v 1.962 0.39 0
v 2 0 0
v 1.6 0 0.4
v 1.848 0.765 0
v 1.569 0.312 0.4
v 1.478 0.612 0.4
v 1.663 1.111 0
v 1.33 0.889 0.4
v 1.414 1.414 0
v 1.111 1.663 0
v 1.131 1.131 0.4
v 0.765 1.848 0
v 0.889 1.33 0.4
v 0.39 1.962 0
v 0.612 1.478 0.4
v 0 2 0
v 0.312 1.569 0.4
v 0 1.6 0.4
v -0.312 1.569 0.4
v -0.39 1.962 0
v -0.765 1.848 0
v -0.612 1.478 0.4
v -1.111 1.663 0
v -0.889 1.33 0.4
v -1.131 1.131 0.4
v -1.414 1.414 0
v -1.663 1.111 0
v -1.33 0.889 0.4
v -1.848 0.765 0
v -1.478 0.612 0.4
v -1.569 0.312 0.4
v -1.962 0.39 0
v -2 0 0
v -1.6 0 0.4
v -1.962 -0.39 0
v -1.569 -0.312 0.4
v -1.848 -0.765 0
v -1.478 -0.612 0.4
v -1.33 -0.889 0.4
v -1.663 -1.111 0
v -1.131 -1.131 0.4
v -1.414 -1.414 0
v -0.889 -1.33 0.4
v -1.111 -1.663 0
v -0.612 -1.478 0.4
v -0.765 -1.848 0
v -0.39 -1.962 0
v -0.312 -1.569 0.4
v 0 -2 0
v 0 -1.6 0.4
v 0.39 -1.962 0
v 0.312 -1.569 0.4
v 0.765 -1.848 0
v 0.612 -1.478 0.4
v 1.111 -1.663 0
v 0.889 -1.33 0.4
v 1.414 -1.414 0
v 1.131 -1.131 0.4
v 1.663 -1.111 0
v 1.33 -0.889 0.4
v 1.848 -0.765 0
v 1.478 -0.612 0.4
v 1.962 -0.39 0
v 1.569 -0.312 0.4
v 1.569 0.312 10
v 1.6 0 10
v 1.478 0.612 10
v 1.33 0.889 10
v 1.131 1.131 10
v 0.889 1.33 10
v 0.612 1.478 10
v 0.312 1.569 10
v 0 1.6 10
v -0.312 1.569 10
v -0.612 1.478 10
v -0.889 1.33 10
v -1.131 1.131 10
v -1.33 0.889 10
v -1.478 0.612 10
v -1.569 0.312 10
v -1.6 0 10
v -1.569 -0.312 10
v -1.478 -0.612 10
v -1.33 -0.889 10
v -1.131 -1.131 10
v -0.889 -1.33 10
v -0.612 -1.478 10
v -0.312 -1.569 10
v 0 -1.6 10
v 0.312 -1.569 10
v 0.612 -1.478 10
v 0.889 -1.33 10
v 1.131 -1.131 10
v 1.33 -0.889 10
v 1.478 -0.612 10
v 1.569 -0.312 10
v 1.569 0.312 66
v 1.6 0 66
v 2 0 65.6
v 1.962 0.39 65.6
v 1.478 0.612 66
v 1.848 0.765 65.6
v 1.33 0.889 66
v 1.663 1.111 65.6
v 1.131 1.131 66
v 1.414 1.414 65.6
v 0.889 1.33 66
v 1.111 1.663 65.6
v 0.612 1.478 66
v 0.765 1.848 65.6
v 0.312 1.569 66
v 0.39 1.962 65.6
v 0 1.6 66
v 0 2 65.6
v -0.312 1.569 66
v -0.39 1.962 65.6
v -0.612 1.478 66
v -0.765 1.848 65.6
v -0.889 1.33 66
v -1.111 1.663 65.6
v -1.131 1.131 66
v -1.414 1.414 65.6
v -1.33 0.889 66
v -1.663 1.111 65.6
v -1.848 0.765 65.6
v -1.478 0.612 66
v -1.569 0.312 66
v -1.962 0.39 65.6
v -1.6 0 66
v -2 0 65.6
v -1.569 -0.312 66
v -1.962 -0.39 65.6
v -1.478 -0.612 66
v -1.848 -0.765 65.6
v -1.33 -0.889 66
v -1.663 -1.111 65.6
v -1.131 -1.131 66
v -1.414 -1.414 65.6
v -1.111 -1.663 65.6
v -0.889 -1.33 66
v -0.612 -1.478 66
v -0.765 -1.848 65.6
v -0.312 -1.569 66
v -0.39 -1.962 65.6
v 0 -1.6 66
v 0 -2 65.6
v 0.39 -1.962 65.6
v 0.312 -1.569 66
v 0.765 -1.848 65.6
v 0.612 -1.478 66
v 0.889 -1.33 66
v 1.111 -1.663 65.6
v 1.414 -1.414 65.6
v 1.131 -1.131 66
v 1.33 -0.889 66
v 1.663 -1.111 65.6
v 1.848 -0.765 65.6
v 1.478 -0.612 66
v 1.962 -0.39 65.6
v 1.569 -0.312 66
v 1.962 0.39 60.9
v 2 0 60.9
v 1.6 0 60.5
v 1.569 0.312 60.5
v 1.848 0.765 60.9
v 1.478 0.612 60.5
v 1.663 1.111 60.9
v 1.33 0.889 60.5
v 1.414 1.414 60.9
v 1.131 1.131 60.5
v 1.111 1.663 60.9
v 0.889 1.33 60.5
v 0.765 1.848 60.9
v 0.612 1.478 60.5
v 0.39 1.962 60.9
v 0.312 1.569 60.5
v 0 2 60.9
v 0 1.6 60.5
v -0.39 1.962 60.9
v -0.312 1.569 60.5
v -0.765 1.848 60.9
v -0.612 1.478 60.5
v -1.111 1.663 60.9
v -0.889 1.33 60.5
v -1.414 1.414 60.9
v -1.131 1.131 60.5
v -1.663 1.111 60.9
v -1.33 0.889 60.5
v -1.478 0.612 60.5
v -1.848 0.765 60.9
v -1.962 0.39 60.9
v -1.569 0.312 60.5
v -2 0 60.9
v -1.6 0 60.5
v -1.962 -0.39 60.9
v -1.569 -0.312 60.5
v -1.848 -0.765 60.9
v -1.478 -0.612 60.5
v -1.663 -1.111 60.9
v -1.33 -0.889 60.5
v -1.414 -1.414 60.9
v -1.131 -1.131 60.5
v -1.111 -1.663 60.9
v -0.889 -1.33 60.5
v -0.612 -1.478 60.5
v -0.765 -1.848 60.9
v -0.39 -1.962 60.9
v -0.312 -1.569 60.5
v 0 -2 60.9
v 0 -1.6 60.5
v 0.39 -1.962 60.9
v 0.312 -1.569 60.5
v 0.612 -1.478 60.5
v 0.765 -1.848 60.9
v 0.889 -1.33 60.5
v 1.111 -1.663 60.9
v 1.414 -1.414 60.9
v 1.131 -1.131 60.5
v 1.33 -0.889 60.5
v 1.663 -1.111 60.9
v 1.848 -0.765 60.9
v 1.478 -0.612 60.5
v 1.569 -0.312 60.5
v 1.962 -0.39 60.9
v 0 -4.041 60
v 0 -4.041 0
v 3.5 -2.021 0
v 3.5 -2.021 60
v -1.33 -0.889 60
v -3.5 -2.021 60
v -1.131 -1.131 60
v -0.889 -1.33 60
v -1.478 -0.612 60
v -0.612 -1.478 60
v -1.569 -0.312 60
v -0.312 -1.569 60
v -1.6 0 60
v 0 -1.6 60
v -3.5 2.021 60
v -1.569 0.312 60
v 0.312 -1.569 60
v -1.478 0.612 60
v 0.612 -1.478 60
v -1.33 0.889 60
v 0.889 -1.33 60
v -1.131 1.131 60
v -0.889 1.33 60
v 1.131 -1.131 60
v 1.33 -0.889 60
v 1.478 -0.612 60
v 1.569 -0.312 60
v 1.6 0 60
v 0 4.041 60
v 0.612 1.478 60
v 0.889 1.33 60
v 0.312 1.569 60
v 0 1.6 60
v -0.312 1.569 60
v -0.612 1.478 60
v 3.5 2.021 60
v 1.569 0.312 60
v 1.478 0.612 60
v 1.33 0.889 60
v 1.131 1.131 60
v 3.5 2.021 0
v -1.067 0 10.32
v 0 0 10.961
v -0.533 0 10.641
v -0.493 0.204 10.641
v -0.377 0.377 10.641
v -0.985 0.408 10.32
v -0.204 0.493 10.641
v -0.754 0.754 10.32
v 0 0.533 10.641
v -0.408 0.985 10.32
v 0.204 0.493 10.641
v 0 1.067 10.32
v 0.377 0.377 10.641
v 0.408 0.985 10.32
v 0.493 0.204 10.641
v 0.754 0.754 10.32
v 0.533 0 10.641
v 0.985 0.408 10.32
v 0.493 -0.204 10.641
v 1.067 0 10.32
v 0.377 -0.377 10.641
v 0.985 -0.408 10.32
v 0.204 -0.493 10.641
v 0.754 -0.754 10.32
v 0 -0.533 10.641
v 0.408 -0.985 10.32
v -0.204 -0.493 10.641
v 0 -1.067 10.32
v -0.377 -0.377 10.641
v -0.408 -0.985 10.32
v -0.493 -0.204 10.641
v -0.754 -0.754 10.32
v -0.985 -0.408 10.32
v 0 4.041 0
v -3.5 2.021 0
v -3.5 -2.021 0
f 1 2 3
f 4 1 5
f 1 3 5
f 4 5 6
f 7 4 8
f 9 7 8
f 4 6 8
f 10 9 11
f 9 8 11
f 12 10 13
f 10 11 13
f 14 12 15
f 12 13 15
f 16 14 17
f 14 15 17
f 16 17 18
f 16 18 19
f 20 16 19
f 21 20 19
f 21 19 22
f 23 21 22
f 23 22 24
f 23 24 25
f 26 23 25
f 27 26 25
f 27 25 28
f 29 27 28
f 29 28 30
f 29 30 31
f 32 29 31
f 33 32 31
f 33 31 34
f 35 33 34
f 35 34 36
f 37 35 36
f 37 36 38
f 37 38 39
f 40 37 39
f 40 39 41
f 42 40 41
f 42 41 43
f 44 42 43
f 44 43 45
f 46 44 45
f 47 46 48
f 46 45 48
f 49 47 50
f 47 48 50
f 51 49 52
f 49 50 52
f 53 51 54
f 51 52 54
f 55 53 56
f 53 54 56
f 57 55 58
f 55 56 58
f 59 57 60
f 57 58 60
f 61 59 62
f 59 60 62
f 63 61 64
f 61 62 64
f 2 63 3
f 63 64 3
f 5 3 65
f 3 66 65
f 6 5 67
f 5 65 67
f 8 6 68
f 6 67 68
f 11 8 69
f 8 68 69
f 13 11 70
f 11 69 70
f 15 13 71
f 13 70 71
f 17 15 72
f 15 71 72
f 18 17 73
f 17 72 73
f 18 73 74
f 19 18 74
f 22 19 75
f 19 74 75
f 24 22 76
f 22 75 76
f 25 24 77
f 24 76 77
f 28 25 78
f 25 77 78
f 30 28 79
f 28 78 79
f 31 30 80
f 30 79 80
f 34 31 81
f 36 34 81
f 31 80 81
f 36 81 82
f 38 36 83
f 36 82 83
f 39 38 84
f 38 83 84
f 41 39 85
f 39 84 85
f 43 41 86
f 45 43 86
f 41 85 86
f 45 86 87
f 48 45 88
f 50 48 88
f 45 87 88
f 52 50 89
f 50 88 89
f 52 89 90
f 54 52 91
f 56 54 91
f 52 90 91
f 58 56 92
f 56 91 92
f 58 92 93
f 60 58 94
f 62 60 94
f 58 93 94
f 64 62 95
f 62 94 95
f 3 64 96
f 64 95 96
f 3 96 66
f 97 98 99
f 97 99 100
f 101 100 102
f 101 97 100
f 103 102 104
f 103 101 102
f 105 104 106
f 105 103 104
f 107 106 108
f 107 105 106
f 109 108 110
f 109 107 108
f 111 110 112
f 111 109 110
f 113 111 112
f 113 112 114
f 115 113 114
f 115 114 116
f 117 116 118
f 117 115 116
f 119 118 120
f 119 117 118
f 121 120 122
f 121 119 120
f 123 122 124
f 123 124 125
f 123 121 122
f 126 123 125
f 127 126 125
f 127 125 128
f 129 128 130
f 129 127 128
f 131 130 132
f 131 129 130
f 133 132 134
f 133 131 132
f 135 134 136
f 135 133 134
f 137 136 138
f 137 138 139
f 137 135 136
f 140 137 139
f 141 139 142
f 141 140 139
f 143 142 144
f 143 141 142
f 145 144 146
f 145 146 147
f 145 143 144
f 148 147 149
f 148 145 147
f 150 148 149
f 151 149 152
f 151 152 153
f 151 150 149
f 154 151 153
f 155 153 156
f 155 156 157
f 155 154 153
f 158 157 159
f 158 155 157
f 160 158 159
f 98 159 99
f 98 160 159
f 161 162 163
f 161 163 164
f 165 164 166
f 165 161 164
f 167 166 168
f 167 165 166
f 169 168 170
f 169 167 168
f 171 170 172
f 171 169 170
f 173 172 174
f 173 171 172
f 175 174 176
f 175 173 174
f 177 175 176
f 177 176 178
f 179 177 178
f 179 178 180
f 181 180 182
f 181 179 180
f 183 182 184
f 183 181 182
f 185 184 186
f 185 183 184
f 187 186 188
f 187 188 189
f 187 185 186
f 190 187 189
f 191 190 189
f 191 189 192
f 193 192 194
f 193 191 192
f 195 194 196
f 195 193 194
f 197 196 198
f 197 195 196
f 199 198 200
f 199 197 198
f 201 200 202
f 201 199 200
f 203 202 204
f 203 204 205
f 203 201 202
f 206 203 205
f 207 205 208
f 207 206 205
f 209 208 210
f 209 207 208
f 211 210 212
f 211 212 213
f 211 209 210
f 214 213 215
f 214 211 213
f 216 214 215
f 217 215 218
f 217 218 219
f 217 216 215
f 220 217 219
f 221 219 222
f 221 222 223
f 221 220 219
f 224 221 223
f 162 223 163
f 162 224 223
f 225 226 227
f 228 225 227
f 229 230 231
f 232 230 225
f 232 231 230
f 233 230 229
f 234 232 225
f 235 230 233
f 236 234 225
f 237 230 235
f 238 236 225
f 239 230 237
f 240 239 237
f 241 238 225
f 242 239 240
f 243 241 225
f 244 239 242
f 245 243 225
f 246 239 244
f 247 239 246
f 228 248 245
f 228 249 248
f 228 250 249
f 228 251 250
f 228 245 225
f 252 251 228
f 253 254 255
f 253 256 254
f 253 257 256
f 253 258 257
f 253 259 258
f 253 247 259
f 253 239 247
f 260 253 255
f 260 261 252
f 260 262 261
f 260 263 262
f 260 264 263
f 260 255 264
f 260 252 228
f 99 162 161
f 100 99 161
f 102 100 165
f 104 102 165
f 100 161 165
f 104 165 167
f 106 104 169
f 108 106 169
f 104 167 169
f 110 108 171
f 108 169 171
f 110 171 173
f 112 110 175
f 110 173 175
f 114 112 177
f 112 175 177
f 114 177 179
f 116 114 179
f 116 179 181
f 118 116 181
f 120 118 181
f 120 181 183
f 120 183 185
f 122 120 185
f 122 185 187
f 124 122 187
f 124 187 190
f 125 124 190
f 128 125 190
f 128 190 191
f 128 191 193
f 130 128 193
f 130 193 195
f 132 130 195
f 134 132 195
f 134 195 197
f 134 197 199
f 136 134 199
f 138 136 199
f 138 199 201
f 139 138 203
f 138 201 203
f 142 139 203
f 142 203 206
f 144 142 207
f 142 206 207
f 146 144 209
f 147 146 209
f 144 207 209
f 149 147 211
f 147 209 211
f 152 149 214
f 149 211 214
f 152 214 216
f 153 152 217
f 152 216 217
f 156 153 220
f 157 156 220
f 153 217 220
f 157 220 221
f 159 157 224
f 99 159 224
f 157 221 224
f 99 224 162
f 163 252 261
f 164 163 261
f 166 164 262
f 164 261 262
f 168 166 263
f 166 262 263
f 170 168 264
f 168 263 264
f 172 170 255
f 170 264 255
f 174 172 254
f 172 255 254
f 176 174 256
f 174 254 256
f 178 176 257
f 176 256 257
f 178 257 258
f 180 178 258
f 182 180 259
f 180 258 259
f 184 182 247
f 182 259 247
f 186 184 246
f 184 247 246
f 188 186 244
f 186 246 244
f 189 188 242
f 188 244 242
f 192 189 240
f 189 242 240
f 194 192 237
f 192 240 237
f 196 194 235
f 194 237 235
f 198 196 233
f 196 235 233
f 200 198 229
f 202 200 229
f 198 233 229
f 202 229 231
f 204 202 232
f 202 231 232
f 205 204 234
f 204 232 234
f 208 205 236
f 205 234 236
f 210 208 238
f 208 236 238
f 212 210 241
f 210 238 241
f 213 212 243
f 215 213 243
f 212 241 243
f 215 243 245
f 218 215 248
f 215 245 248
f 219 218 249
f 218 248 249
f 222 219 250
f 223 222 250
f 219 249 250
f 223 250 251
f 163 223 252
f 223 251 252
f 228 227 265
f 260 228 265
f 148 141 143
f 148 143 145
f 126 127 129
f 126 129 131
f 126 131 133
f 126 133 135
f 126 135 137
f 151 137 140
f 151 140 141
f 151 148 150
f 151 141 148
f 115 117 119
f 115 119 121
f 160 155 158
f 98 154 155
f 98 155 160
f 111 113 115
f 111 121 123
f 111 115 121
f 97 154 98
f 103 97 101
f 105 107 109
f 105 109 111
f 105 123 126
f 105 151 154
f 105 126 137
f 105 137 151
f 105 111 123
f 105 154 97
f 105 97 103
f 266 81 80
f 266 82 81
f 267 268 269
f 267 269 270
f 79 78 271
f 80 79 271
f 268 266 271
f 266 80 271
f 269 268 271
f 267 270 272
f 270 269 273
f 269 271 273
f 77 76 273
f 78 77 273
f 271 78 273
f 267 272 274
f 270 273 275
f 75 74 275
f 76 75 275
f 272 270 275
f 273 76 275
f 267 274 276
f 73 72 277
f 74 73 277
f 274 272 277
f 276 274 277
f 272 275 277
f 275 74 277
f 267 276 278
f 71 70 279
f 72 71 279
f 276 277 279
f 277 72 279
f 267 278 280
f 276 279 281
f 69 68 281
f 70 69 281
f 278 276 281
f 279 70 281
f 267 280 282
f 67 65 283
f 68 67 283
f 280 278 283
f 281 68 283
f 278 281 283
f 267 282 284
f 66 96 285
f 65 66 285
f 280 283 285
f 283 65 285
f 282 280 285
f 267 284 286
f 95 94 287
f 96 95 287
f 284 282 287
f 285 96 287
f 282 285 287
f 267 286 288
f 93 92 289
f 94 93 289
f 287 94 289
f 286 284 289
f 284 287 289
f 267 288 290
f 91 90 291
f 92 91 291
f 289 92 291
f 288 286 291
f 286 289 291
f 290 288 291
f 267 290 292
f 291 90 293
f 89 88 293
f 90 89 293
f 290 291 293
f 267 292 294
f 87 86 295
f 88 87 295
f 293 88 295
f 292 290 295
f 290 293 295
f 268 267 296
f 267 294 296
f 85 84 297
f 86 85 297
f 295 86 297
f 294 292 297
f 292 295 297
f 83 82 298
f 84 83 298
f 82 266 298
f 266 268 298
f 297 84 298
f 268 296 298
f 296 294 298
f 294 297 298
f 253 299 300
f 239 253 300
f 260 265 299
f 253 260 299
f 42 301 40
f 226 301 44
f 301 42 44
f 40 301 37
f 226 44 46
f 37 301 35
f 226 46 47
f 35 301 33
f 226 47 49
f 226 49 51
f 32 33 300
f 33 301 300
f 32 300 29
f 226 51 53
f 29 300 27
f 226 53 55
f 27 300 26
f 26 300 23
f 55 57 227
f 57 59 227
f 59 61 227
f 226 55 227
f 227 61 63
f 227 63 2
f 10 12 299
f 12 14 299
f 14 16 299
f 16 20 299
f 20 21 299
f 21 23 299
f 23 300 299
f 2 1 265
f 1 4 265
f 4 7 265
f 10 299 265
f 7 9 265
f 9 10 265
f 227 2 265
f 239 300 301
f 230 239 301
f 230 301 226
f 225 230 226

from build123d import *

# Parameters (mm, degrees)
EXTRUDE_1_DEPTH             = 60
SKETCH_2_R                  = 2
EXTRUDE_2_DEPTH             = 6
SKETCH_3_R                  = 2
SKETCH_3_R_2                = 1.6
CUT_EXTRUDE_3_DEPTH         = 0.5
CHAMFER_1_SIZE              = 0.4
HOLE_WIZARD_M31_D           = 3.2
HOLE_WIZARD_M31_DEPTH       = 10
HOLE_WIZARD_M31_CSINK_D     = 4
HOLE_WIZARD_M31_CSINK_ANGLE = 90
HOLE_WIZARD_M31_TIP         = 0.96137699


with BuildPart() as part:
    # Эскиз1 → Вытянуть1 (new body)
    with BuildSketch(Plane.XY):
        Polygon((0, 4.041451884), (-3.5, 2.020725942), (-3.5, -2.020725942), (0, -4.041451884), (3.5, -2.020725942), (3.5, 2.020725942), align=None)
    extrude(amount=EXTRUDE_1_DEPTH)

    # Эскиз2 → Вытянуть2 (add)
    with BuildSketch(Plane.XY.offset(60)):
        Circle(SKETCH_2_R)
    extrude(amount=EXTRUDE_2_DEPTH)

    # Эскиз3 → Вырез-Вытянуть3 (cut)
    with BuildSketch(Plane.XY.offset(60)):
        Circle(SKETCH_3_R)
        Circle(SKETCH_3_R_2, mode=Mode.SUBTRACT)
    extrude(amount=CUT_EXTRUDE_3_DEPTH, mode=Mode.SUBTRACT)

    # Фаска1
    chamfer_1_edges = [part.edges().sort_by_distance(p)[0] for p in [
        (-2, 0, 66),
        (-2, 0, 60.5),
    ]]
    chamfer(chamfer_1_edges, length=CHAMFER_1_SIZE - 0.0001)  # a hair under: the kernel refuses the full size

    # Отверстие с зазором M31
    with Locations(Plane(origin=(0, 0, 0), x_dir=(-1, 0, 0), z_dir=(0, 0, -1))):
        with Locations((0, 0)):
            CounterSinkHole(HOLE_WIZARD_M31_D / 2, HOLE_WIZARD_M31_CSINK_D / 2, depth=HOLE_WIZARD_M31_DEPTH, counter_sink_angle=HOLE_WIZARD_M31_CSINK_ANGLE)
            with Locations((0, 0, -(HOLE_WIZARD_M31_DEPTH + HOLE_WIZARD_M31_TIP / 2))):  # 118° drill point
                Cone(0, HOLE_WIZARD_M31_D / 2, HOLE_WIZARD_M31_TIP, mode=Mode.SUBTRACT)


solid = part.part
